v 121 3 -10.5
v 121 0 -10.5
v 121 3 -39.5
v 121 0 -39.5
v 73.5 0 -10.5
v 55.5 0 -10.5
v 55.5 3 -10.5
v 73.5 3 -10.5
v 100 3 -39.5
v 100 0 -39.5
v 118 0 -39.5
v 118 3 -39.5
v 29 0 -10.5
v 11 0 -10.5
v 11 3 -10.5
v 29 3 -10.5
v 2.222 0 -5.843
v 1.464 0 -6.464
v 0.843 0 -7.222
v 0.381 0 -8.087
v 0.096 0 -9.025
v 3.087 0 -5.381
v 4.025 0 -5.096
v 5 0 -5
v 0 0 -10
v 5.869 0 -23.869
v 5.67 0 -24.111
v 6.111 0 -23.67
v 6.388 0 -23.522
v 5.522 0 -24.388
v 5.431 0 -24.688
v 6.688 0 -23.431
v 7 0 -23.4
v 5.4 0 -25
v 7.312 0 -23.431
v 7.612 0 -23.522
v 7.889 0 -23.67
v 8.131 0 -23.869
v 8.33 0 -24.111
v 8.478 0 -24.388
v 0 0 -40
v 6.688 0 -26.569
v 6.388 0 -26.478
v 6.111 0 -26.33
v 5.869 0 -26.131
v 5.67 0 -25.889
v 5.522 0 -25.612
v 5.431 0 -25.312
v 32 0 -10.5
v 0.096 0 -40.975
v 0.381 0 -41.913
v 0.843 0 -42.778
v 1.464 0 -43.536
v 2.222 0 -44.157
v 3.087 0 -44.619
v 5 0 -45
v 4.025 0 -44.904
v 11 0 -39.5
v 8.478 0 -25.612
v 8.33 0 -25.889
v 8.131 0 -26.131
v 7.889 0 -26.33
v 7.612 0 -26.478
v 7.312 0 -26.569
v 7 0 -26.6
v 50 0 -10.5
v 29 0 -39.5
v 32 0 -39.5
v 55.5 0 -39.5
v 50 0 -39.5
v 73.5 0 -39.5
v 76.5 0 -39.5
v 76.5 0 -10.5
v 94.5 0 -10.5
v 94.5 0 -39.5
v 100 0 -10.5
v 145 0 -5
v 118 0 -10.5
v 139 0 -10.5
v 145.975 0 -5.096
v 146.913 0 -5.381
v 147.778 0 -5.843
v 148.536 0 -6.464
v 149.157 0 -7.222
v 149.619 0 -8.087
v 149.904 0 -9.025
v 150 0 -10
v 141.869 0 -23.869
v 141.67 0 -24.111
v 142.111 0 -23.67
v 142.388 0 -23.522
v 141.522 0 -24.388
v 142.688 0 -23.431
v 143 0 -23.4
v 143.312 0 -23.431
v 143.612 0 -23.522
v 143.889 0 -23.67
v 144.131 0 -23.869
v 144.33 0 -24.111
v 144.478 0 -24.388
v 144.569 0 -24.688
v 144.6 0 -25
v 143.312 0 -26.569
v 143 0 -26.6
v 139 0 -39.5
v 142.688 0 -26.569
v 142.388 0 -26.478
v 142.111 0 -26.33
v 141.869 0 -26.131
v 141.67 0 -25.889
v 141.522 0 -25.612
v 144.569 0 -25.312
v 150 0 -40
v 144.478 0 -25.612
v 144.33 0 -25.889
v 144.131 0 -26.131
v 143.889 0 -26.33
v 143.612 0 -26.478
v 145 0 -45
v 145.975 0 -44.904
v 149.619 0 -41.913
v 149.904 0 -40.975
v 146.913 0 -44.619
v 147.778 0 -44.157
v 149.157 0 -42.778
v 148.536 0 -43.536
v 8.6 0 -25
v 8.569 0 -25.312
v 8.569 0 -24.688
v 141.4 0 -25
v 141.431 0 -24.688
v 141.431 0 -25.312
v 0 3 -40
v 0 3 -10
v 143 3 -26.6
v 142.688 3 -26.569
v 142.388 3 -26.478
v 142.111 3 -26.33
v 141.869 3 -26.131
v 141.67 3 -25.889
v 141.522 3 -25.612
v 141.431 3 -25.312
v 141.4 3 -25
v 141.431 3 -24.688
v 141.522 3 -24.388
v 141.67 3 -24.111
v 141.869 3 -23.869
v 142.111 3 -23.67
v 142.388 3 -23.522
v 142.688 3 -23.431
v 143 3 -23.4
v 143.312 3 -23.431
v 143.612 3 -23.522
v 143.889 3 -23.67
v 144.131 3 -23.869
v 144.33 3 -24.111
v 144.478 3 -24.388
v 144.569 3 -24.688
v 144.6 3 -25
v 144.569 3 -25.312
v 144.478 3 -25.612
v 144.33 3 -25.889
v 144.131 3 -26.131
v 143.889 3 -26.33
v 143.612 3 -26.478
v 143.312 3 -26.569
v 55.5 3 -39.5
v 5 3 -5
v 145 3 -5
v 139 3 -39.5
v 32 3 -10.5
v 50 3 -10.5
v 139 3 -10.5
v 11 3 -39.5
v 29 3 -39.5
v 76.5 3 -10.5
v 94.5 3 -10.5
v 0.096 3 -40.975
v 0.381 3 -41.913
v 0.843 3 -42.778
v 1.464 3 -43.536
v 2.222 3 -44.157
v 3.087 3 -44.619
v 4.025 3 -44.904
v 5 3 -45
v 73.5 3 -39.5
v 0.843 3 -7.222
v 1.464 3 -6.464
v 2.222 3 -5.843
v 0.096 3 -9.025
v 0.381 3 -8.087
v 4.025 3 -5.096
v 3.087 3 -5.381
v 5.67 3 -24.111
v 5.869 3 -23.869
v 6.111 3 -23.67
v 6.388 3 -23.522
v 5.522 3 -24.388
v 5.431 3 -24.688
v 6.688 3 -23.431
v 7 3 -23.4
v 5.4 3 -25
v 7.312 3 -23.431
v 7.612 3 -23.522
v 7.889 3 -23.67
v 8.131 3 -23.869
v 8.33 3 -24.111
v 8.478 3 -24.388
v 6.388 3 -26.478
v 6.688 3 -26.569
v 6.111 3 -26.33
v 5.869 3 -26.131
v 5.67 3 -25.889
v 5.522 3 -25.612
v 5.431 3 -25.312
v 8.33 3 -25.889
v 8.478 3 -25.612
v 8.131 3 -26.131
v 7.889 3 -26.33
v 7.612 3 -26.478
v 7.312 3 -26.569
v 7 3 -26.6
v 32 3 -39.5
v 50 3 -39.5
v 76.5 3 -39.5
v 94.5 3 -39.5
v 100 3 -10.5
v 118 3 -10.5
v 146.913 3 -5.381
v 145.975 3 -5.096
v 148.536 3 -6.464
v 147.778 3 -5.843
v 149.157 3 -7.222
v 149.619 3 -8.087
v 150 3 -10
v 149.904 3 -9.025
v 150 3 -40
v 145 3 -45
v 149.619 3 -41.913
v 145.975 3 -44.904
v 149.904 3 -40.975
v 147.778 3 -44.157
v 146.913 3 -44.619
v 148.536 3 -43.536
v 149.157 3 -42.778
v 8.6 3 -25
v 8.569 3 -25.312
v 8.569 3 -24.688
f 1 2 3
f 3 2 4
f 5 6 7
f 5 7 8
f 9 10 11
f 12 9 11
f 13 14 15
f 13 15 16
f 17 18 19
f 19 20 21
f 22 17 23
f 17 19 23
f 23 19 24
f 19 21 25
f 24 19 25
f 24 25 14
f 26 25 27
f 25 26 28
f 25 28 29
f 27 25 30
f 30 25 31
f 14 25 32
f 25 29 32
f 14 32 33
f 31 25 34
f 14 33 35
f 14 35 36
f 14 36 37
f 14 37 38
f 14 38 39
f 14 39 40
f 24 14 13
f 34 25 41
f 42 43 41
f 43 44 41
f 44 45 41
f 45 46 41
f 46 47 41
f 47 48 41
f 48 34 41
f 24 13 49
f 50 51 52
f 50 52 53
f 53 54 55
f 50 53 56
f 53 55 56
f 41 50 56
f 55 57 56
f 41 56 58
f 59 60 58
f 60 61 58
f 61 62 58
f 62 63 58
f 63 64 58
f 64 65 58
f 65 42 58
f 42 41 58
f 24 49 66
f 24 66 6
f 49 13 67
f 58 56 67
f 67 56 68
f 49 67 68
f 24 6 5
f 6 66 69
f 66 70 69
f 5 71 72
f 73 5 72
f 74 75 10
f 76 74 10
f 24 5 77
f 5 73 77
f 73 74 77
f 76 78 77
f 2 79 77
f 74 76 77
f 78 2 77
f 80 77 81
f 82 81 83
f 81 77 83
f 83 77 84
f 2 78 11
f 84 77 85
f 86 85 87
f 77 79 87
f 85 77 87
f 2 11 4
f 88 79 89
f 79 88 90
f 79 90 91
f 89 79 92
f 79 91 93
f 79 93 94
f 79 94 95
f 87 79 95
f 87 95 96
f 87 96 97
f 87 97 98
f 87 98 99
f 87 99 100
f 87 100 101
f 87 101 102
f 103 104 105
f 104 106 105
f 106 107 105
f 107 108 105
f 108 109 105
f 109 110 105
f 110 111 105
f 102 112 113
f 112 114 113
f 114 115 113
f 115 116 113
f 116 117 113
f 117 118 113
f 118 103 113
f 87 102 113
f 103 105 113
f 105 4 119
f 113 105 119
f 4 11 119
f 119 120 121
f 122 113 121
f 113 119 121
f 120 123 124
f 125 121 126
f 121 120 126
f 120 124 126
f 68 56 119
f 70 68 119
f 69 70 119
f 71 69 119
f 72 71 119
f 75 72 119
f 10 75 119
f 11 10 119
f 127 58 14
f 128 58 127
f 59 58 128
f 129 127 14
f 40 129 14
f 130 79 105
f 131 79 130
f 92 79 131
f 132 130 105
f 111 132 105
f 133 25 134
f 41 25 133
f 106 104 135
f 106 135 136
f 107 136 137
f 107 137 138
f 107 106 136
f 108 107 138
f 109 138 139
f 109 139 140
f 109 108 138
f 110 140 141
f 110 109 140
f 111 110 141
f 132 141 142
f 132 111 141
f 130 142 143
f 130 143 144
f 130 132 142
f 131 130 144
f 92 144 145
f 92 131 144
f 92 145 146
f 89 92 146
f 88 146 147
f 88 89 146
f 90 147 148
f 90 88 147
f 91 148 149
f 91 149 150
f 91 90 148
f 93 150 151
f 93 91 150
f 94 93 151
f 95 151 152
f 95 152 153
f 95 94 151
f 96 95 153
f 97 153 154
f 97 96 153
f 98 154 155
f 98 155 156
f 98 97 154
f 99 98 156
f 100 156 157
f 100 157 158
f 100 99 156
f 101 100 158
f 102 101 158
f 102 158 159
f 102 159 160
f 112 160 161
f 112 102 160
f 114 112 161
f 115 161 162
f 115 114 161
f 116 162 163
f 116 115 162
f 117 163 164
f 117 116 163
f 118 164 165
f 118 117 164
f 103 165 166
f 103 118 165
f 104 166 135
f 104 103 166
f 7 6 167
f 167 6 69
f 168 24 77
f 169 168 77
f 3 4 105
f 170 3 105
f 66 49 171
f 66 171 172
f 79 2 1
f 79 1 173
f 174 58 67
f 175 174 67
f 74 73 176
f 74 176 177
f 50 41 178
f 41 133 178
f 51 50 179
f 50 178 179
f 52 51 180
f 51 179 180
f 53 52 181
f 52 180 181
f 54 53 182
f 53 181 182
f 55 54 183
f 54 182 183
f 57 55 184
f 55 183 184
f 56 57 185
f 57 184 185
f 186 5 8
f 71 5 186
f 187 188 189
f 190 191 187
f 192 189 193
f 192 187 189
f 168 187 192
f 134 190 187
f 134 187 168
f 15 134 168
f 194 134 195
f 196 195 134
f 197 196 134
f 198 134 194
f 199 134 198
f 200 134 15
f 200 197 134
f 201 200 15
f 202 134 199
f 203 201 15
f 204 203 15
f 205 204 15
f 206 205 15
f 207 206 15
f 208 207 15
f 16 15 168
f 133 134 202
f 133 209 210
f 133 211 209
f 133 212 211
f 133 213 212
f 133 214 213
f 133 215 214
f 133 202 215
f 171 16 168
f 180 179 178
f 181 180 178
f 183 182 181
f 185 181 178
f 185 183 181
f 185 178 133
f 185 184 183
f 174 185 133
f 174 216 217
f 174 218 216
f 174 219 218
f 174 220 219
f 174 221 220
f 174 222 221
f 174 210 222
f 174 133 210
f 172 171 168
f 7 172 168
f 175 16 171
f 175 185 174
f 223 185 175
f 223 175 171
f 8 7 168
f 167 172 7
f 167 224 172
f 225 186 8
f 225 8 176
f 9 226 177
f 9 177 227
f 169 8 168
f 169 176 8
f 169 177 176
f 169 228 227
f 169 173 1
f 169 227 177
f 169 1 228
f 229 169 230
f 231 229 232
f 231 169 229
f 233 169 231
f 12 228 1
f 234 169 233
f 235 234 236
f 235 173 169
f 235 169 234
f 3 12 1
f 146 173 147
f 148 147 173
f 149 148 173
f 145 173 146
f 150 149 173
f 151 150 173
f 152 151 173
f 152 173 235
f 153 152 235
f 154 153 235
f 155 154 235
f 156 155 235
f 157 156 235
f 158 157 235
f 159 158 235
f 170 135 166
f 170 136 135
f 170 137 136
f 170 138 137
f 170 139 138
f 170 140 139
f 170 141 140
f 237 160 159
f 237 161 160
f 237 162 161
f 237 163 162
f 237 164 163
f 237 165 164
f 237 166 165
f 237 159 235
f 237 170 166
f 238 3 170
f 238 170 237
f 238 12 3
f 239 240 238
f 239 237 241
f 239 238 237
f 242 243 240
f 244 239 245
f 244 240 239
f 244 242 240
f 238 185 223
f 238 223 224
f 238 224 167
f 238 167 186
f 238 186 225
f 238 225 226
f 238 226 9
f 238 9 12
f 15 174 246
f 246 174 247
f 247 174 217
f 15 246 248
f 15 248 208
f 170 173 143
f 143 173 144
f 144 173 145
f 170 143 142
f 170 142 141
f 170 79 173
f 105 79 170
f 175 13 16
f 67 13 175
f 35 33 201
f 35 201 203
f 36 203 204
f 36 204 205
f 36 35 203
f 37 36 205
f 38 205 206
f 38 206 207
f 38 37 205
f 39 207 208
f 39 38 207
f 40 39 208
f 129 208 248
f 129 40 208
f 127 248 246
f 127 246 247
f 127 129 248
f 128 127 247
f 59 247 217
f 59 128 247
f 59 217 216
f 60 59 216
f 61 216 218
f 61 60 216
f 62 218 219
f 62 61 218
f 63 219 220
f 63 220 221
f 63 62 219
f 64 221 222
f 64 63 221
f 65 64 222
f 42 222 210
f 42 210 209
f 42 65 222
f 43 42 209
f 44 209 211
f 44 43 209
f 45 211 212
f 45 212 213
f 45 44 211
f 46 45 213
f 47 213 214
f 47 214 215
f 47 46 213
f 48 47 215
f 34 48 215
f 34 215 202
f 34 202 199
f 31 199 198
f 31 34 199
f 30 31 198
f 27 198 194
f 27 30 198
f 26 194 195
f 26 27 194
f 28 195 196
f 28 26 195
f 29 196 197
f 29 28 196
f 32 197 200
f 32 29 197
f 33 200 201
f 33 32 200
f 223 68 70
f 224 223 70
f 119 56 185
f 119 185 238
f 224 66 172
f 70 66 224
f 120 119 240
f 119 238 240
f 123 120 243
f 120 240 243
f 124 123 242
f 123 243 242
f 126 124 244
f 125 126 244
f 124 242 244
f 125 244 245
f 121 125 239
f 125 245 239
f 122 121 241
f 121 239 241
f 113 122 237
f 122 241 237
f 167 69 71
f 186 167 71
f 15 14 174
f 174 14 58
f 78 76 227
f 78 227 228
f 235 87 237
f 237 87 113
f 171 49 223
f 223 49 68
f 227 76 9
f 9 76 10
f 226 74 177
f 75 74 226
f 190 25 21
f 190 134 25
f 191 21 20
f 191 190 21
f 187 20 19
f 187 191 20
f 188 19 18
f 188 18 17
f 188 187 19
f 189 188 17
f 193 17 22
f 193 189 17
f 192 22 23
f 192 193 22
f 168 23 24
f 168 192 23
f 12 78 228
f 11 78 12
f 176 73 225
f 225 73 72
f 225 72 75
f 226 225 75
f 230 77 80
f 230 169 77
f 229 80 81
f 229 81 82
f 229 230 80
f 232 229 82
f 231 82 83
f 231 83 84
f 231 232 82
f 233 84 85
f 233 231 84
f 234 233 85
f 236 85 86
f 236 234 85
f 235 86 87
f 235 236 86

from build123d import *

# Parameters (mm, degrees)
SKETCH_1_W      = 150
SKETCH_1_H      = 40
SKETCH_1_R      = 1.6
SKETCH_1_W_2    = 18
SKETCH_1_H_2    = 29.000000001
EXTRUDE_1_DEPTH = 3
FILLET_1_R      = 5


with BuildPart() as part:
    # ｽｹｯﾁ1 → ﾎﾞｽ - 押し出し1 (new body)
    with BuildSketch(Plane(origin=(0, 0, 0), x_dir=(1, 0, 0), z_dir=(0, 1, 0))):
        with Locations((75, 25)):
            Rectangle(SKETCH_1_W, SKETCH_1_H)
        with Locations(Location((143, 25, 0), (0, 0, 90))):
            Circle(SKETCH_1_R, mode=Mode.SUBTRACT)
        with Locations(Location((7, 25, 0), (0, 0, 270))):
            Circle(SKETCH_1_R, mode=Mode.SUBTRACT)
        with Locations((19.999999998, 24.999999999)):
            Rectangle(SKETCH_1_W_2, SKETCH_1_H_2, mode=Mode.SUBTRACT)
        with Locations((40.999999998, 24.999999999)):
            Rectangle(SKETCH_1_W_2, SKETCH_1_H_2, mode=Mode.SUBTRACT)
        with Locations((64.5, 24.999999999)):
            Rectangle(SKETCH_1_W_2, SKETCH_1_H_2, mode=Mode.SUBTRACT)
        with Locations((85.5, 24.999999999)):
            Rectangle(SKETCH_1_W_2, SKETCH_1_H_2, mode=Mode.SUBTRACT)
        with Locations((109.000000002, 24.999999999)):
            Rectangle(SKETCH_1_W_2, SKETCH_1_H_2, mode=Mode.SUBTRACT)
        with Locations((130.000000002, 24.999999999)):
            Rectangle(SKETCH_1_W_2, SKETCH_1_H_2, mode=Mode.SUBTRACT)
    extrude(amount=EXTRUDE_1_DEPTH)

    # ﾌｨﾚｯﾄ1
    fillet_1_edges = [part.edges().sort_by_distance(p)[0] for p in [
        (0, 1.5, -45),
        (150, 1.5, -45),
        (150, 1.5, -5),
        (0, 1.5, -5),
    ]]
    fillet(fillet_1_edges, radius=FILLET_1_R)


solid = part.part
